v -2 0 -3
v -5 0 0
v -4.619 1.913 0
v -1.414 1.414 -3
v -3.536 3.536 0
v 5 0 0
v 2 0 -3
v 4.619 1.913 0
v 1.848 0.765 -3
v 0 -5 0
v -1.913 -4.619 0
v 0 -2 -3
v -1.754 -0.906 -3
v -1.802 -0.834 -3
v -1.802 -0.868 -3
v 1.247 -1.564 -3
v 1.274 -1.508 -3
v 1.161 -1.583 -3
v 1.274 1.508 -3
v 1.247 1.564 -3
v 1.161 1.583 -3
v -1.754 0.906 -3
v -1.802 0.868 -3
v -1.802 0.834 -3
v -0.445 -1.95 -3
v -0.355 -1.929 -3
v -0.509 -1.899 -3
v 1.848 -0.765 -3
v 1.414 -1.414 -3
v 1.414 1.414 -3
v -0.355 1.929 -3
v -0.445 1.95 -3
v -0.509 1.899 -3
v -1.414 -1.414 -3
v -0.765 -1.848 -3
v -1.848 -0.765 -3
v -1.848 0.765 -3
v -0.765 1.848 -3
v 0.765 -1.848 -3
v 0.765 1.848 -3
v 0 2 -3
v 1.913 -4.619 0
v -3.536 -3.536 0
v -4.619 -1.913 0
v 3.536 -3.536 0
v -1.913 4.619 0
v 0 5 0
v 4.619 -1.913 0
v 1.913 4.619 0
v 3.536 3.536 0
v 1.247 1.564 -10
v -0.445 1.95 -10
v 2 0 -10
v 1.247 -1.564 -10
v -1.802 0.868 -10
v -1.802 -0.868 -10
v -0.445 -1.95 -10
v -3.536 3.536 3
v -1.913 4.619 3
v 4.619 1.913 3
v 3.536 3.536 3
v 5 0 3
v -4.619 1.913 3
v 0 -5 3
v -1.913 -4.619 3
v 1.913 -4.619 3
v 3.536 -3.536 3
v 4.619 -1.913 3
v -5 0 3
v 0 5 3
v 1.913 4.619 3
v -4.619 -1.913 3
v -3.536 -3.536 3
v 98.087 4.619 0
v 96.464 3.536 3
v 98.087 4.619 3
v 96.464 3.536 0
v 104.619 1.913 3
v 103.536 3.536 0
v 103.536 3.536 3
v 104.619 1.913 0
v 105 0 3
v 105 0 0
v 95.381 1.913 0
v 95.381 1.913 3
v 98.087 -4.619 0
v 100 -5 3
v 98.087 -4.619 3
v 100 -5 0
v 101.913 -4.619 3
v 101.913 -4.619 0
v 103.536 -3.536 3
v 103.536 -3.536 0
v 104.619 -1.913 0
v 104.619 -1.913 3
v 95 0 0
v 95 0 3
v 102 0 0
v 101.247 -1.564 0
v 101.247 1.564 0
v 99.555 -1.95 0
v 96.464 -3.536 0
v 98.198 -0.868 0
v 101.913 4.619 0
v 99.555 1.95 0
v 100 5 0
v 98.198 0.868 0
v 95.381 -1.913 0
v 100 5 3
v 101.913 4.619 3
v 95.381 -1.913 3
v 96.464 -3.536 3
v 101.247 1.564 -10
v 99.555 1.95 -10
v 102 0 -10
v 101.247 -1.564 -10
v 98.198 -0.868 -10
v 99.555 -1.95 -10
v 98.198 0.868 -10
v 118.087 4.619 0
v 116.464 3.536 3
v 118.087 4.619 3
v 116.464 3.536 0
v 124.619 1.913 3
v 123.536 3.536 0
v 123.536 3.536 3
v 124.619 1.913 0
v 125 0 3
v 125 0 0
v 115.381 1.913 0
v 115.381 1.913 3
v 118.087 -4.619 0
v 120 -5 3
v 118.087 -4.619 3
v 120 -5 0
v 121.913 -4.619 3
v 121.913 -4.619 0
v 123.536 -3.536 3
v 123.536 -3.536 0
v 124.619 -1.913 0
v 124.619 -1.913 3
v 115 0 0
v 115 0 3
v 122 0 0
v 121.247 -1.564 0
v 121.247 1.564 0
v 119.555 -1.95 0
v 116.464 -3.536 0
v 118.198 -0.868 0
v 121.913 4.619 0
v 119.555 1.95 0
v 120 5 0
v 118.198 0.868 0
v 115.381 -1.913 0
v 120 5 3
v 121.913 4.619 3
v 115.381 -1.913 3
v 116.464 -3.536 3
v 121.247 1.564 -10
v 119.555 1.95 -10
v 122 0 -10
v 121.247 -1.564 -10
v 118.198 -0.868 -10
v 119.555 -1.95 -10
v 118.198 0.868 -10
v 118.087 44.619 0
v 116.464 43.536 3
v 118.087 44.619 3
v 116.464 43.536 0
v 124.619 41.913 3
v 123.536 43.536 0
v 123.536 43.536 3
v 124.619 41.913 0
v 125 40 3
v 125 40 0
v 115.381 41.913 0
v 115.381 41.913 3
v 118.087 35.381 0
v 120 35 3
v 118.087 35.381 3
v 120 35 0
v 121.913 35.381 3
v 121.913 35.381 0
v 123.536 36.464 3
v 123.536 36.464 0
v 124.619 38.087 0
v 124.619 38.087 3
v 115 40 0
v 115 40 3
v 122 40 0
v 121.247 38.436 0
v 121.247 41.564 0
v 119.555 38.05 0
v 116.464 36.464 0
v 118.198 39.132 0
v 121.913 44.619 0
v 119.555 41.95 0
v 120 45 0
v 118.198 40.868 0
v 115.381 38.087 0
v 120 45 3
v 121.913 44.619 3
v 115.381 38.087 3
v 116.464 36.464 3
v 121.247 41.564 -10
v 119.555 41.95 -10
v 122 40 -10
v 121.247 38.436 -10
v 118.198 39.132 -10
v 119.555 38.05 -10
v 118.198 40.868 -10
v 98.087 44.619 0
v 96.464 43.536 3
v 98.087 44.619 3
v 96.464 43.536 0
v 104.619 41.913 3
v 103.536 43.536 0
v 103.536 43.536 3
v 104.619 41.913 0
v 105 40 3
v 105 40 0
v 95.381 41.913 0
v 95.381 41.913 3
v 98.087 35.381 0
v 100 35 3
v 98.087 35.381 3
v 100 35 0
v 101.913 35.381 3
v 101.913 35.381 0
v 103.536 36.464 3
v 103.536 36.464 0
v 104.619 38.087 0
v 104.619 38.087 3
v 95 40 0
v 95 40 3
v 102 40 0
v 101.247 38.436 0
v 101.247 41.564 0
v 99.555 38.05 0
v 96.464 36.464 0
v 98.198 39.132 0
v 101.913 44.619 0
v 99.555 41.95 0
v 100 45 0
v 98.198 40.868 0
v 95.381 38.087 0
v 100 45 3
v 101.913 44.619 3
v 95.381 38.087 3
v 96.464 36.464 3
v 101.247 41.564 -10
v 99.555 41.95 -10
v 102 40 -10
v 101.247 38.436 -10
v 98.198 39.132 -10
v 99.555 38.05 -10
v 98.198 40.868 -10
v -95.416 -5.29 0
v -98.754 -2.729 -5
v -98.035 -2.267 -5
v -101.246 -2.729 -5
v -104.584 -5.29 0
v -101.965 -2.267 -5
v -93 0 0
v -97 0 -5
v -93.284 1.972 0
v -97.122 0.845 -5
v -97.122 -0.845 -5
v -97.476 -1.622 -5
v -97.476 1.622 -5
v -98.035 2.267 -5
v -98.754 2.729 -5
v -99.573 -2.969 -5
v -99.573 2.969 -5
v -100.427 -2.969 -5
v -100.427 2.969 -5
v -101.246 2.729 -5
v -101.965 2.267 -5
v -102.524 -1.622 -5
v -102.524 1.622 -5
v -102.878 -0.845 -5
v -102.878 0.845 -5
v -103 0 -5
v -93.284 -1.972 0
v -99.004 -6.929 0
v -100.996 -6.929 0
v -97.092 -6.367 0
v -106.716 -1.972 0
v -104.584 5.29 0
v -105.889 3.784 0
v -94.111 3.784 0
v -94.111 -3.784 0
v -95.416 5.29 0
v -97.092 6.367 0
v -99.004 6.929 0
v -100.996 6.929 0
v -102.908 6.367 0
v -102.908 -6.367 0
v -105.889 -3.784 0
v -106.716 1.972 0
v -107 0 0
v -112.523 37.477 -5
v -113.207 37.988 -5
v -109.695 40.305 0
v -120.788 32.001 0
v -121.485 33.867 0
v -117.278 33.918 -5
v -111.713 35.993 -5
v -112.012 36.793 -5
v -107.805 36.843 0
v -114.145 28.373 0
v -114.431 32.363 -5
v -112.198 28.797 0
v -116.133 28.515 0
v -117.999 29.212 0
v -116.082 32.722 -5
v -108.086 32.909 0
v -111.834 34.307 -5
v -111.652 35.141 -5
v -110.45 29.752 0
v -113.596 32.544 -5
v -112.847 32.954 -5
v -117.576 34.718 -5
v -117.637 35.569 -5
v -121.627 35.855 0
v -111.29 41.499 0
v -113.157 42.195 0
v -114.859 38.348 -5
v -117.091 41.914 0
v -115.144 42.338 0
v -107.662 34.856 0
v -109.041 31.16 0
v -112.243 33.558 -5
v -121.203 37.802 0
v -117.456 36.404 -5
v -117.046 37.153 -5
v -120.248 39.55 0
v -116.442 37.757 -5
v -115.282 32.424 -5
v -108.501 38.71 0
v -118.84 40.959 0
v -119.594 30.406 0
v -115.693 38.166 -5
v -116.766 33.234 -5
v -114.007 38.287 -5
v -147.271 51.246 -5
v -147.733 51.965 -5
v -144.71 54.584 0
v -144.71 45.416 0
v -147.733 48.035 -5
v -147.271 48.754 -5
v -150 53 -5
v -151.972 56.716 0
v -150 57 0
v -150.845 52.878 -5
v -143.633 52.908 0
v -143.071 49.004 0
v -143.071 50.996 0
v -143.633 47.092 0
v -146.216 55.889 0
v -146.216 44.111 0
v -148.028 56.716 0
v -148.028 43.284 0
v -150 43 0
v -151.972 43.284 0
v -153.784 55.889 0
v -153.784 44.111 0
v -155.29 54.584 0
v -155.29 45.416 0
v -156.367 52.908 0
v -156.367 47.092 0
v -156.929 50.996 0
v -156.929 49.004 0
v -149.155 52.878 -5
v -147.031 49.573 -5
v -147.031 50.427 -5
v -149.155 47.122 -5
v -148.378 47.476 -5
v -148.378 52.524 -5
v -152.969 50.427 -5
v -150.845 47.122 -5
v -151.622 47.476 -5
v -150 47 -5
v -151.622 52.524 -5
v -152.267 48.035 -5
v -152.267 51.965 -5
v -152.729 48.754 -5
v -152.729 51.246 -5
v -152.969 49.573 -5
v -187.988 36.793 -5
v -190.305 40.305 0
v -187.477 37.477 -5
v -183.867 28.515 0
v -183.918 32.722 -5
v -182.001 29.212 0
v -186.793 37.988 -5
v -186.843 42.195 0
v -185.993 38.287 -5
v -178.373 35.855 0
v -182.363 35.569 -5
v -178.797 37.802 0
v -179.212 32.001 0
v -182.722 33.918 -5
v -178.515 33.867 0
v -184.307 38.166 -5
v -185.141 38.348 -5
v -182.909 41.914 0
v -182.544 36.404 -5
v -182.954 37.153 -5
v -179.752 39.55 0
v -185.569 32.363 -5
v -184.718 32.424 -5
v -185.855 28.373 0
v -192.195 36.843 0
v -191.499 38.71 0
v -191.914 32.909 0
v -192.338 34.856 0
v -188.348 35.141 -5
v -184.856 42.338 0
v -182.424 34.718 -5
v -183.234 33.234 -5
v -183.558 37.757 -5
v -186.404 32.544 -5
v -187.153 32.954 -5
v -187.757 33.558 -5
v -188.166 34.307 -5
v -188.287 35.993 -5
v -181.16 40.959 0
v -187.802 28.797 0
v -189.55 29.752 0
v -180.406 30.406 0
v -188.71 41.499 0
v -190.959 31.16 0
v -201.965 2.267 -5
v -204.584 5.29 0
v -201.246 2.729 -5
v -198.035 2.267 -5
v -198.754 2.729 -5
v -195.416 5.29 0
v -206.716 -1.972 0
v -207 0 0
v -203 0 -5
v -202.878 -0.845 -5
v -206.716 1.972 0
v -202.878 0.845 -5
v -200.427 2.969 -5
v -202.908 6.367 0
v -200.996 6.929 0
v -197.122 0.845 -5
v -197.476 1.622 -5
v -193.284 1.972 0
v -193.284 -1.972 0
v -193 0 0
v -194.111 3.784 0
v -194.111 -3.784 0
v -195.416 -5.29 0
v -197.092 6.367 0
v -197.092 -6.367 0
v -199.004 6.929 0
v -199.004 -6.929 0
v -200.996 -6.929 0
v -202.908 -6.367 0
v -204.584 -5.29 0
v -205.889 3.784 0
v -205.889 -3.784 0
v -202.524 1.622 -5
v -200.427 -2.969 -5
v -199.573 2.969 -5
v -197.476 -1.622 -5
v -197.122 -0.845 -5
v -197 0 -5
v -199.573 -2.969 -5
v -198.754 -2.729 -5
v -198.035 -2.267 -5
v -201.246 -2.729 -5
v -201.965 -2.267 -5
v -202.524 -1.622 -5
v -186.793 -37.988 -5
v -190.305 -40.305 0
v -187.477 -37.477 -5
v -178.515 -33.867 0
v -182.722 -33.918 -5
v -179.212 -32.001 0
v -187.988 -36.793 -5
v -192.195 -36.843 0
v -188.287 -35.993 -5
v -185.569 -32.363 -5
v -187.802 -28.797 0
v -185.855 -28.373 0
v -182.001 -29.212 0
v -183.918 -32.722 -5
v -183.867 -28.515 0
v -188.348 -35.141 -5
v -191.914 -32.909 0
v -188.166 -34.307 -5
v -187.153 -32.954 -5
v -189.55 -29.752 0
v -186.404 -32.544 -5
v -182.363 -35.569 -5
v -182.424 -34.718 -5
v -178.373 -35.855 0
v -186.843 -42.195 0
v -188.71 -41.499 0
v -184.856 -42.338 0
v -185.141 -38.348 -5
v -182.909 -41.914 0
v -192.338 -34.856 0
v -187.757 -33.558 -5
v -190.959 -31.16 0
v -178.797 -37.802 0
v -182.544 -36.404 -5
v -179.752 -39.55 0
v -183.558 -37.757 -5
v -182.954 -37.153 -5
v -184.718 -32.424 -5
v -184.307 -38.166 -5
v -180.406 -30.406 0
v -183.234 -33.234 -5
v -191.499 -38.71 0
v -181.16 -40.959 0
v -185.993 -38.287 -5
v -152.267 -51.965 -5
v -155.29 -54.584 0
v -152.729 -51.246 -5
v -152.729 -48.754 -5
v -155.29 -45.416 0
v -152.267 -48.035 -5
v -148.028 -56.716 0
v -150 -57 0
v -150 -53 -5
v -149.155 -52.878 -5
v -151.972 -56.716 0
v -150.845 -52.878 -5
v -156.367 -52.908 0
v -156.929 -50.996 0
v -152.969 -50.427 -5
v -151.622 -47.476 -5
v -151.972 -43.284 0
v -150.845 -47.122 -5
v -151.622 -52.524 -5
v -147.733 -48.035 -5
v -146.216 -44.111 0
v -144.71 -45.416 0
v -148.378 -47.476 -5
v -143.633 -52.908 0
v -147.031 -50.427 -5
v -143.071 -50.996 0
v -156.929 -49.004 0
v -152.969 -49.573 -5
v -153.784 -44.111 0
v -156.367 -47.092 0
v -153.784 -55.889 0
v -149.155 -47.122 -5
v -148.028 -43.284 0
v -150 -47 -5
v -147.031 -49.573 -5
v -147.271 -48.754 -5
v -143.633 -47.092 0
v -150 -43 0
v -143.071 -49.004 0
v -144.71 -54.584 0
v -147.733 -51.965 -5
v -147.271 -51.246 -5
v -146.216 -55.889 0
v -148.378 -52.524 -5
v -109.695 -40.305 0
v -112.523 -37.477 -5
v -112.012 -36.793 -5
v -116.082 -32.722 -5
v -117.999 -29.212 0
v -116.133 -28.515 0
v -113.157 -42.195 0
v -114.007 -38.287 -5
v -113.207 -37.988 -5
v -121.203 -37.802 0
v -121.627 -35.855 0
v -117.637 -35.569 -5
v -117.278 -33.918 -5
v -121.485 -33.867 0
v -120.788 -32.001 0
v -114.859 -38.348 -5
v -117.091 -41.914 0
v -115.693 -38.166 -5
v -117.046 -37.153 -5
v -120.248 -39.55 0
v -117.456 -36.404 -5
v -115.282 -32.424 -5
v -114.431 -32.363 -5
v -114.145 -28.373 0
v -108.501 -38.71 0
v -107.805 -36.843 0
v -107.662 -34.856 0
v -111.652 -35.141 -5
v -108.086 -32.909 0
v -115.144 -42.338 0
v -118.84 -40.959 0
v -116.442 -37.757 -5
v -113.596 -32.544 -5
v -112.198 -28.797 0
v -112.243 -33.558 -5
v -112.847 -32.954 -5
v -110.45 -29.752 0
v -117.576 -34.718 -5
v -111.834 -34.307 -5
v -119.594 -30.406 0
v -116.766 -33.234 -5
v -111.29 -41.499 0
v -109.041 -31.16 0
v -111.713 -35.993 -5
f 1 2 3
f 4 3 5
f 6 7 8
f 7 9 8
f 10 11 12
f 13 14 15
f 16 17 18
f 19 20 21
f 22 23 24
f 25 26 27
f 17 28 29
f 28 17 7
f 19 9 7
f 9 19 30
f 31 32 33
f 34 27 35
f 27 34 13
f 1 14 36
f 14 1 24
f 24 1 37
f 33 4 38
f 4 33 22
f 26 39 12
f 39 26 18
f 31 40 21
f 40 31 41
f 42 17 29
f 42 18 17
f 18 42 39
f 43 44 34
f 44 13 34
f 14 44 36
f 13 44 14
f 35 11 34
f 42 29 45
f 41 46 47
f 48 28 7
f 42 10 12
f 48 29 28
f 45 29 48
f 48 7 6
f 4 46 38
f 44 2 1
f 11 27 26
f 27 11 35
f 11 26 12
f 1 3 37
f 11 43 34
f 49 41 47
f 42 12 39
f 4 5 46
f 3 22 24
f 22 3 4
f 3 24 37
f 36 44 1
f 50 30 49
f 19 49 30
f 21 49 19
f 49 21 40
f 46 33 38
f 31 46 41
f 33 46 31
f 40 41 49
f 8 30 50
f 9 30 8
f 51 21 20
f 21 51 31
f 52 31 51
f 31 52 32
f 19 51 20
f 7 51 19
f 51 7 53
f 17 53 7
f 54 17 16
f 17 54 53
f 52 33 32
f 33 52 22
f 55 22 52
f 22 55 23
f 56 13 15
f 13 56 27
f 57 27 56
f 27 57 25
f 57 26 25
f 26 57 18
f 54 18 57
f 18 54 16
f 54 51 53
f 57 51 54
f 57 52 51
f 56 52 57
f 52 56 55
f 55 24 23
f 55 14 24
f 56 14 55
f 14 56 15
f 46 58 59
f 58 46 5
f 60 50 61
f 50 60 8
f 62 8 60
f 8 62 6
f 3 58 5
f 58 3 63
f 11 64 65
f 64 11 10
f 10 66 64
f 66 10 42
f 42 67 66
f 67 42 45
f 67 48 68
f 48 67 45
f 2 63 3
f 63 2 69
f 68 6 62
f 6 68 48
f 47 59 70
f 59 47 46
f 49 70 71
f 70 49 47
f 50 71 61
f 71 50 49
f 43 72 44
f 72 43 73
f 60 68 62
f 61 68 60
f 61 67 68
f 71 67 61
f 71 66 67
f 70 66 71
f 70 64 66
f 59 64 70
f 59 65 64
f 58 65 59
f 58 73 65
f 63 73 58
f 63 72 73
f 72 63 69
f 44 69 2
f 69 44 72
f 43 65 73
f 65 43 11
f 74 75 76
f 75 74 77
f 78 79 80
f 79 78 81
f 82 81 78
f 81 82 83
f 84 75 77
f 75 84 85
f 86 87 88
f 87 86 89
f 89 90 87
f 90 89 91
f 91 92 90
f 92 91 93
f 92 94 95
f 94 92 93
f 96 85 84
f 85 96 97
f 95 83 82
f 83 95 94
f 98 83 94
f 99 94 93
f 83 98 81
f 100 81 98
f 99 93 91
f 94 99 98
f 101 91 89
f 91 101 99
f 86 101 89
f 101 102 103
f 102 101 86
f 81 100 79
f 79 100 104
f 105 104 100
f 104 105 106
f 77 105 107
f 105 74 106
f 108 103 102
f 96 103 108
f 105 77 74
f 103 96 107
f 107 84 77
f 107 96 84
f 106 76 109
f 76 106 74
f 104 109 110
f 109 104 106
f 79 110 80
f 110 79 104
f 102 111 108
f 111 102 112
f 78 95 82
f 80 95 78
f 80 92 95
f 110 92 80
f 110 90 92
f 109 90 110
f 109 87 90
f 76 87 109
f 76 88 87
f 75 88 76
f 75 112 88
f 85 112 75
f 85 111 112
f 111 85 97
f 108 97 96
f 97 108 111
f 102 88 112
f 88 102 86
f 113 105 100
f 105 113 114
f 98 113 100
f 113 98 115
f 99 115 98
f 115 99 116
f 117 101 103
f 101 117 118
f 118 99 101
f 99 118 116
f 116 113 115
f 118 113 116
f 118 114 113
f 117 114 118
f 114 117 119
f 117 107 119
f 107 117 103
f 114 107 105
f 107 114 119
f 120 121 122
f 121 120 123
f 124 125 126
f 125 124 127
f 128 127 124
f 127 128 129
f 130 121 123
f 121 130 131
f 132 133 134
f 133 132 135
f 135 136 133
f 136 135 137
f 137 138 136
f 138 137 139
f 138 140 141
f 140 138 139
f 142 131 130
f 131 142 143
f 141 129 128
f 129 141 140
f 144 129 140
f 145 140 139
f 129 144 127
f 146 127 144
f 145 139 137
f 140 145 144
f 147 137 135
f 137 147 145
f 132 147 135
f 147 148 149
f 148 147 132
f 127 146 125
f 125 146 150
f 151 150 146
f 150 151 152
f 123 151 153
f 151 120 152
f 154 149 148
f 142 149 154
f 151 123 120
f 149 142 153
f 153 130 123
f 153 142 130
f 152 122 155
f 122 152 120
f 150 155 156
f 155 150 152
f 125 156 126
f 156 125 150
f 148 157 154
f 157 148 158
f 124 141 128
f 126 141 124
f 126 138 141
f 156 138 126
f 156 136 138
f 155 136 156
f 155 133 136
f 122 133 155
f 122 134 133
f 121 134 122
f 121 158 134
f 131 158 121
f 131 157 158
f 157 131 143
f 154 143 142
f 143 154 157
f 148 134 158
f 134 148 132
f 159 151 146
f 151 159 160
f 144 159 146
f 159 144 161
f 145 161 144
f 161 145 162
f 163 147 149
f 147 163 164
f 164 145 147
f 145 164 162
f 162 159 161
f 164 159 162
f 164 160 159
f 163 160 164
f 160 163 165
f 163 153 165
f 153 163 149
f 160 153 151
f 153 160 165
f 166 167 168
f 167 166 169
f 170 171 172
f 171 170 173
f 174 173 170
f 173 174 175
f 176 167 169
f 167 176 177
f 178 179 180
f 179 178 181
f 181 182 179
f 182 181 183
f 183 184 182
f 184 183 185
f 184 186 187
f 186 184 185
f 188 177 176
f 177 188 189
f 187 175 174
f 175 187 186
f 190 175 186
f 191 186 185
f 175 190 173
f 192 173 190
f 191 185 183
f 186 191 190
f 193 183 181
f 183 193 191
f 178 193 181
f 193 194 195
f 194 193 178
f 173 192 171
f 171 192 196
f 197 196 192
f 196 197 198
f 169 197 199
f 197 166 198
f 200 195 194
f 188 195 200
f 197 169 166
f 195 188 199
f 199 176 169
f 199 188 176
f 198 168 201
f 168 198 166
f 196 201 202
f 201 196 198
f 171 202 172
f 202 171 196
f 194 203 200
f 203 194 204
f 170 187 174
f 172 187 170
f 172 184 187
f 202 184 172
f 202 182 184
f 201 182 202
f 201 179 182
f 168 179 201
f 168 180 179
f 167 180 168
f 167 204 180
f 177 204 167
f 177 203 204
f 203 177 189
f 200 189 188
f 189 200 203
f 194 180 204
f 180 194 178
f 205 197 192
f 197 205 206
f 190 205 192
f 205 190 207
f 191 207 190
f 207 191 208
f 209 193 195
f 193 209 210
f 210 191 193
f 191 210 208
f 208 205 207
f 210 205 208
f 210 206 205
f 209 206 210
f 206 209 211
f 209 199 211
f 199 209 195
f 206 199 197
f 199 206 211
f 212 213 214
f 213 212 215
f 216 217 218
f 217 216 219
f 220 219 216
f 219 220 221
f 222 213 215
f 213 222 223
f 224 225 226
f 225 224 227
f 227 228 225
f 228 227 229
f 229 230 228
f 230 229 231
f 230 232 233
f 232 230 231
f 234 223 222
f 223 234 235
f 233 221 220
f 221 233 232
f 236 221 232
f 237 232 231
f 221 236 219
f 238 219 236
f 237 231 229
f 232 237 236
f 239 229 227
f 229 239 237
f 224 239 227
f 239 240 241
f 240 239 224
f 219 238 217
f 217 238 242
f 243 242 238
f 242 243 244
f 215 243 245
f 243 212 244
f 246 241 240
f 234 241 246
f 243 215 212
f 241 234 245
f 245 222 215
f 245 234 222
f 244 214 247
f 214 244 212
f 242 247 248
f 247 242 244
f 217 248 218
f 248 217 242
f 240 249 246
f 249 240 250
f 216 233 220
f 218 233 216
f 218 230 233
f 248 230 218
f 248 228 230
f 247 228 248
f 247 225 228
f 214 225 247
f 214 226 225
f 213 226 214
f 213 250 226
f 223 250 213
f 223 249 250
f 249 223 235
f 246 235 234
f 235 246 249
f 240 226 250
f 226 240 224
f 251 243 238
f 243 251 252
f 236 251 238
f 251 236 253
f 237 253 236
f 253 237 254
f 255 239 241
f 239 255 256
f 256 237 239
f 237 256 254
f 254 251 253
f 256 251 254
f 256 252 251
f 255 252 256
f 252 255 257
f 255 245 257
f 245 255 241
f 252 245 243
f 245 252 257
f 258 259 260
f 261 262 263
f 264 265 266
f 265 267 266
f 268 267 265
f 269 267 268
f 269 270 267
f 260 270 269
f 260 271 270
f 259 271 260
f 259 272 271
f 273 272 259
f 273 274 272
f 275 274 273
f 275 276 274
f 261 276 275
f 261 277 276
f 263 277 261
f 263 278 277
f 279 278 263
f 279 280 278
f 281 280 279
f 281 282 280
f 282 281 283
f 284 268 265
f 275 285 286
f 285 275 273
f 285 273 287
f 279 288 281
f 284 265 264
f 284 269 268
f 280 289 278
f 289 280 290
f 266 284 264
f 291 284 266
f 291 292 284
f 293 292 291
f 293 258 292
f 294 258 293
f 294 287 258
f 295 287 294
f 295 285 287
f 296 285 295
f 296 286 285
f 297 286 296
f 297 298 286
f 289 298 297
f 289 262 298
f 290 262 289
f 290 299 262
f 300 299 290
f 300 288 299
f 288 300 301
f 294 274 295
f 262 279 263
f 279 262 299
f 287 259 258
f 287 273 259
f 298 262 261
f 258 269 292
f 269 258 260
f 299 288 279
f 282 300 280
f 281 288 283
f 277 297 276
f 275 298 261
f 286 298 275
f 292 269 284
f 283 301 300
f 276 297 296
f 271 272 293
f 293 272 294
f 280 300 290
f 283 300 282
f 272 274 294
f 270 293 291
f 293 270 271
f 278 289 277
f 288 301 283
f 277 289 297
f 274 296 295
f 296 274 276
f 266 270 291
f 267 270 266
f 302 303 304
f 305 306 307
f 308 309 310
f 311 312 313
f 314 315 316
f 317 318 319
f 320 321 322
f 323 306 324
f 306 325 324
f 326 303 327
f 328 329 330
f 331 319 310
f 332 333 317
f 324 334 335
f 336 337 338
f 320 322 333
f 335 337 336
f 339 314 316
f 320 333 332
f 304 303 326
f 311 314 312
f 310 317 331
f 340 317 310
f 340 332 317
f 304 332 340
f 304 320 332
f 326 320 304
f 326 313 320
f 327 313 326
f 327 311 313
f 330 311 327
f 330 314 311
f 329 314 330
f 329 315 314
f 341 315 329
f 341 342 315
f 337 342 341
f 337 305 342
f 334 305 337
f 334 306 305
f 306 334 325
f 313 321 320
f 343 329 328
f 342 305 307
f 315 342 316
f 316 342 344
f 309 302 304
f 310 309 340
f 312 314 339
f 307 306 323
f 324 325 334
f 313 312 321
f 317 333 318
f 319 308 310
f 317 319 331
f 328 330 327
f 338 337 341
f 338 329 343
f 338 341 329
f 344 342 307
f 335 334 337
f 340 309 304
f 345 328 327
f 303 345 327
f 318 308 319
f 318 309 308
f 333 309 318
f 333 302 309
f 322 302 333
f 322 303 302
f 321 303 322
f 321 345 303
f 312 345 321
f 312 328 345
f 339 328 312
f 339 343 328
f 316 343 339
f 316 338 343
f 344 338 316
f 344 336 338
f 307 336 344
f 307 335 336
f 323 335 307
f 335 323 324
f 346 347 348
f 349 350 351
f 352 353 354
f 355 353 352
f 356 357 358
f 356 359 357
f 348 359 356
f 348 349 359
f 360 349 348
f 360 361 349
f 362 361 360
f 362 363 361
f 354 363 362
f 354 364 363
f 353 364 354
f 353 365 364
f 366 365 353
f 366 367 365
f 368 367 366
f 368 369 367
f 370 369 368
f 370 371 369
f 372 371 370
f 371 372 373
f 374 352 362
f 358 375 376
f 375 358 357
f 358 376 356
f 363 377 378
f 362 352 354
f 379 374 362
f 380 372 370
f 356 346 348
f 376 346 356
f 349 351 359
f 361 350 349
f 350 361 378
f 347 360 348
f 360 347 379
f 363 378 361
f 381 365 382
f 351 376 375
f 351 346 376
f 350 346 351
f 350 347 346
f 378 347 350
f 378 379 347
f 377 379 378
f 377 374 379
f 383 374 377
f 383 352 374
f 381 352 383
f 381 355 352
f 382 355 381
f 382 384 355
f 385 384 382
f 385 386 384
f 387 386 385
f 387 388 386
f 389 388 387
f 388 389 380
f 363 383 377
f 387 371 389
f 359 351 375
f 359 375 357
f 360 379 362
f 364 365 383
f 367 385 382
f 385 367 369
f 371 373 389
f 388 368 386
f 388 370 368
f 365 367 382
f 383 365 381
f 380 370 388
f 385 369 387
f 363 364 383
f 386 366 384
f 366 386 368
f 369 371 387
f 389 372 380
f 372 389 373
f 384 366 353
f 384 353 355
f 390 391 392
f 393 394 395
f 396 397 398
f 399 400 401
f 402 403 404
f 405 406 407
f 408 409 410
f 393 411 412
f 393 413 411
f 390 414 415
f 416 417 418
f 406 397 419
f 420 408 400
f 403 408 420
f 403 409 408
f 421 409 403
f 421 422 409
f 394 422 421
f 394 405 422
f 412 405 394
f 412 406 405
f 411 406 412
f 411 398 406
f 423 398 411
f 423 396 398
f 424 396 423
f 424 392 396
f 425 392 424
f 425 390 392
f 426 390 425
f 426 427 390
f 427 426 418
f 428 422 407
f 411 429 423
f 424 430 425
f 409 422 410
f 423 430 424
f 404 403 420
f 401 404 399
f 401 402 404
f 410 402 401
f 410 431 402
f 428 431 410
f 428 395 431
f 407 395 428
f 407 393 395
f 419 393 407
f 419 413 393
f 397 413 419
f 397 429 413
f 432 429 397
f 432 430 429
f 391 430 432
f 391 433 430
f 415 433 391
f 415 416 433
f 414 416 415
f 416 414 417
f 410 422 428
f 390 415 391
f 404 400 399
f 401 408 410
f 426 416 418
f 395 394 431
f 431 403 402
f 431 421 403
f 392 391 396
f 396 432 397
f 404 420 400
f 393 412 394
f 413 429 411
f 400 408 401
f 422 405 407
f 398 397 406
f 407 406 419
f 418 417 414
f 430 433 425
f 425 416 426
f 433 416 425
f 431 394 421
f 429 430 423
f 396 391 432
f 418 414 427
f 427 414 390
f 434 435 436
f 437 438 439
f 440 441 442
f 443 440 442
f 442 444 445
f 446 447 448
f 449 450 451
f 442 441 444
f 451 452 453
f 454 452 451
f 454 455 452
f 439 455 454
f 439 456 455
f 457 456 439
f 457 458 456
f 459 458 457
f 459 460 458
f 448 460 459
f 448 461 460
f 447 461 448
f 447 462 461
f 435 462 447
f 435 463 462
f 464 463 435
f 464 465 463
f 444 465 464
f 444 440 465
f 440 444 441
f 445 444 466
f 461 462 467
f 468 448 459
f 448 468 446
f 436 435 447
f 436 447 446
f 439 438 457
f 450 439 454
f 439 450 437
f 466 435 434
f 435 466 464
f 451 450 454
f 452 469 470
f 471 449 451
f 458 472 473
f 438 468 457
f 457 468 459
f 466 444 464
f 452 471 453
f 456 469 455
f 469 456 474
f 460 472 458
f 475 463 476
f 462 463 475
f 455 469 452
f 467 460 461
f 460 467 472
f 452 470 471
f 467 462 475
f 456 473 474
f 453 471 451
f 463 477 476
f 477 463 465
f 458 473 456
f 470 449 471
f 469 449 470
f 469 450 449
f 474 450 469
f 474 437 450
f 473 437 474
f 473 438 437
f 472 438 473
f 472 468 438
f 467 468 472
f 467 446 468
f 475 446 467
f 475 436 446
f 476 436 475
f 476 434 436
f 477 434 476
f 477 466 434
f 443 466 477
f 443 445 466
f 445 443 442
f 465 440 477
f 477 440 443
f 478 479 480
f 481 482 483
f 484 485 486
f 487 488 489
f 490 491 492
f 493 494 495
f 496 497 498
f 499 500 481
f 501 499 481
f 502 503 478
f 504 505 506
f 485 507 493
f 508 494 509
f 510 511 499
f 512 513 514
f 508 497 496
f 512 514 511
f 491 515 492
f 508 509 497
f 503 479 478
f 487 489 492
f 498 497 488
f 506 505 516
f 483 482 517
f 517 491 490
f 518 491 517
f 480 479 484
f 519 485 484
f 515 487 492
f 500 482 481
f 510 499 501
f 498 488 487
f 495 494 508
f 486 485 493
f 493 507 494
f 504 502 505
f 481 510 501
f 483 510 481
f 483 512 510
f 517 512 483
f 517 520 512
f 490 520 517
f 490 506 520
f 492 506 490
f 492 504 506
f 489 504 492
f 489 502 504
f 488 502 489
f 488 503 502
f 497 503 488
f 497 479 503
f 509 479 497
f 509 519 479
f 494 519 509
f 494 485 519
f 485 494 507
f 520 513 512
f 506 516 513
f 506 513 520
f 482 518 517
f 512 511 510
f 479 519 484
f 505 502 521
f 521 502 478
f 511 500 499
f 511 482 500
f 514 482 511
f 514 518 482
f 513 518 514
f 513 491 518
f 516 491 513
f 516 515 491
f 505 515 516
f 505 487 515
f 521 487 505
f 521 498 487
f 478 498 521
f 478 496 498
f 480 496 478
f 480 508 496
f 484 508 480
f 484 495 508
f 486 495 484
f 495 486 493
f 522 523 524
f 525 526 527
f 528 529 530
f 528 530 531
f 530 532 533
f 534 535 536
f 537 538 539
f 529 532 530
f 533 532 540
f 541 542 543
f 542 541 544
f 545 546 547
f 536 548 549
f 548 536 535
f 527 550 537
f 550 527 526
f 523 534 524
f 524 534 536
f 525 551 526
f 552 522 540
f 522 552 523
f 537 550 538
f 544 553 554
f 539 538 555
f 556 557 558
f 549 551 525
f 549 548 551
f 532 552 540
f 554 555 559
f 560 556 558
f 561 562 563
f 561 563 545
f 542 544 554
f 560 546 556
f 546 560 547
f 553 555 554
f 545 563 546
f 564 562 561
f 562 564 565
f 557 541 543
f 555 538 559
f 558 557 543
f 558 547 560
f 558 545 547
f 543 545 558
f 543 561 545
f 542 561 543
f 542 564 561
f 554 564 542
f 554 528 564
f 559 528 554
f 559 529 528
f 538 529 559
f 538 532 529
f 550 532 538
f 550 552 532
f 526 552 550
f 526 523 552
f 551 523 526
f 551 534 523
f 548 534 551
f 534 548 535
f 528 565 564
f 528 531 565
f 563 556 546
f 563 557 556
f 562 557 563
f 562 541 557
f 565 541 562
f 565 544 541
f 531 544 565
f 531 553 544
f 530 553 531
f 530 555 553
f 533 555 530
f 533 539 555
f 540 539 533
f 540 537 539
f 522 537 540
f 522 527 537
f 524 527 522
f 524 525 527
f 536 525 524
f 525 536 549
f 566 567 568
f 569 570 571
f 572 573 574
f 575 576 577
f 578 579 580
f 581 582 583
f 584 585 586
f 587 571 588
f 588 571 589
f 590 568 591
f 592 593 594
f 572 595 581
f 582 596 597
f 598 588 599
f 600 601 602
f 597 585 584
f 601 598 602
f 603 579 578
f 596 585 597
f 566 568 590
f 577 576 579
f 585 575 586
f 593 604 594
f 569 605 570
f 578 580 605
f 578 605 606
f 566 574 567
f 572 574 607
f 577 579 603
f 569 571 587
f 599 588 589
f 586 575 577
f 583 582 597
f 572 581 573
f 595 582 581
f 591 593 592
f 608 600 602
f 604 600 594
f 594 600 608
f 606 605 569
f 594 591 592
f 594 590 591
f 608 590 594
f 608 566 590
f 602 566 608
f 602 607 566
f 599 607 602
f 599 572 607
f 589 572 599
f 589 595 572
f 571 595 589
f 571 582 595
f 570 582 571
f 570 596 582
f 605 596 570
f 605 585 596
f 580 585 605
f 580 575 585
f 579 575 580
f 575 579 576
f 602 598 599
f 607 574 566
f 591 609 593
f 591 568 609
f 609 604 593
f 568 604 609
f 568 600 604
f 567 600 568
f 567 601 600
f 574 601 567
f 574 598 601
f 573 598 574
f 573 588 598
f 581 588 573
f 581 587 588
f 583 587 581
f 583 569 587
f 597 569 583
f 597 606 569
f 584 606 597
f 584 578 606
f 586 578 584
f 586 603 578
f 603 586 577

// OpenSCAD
/*
    Intended to make space for a fastener.

    parameters:
    -head           a vector [head length, head radius]
    -bore           a vector [bore length, bore radius]
    -countersink    countersink length, requires head radius and bore radius
*/

module fastener_hole(
    head = [0, 5],
    bore = [0, 3],
    countersink = 5
) {
    if (head[0] && head[1])
    cylinder(h = head[0], r = head[1], center = false);
    translate([0,0,-countersink]) {
        if (countersink)
        cylinder(h = countersink, r1 = bore[1], r2 = head[1], center = false);

        translate([0,0,-bore[0]]) {
            if (bore[0] && bore[1])
            cylinder(h = bore[0], r = bore[1], center = false);
        }
    }
}

module fastener_block(
    size,
    head = [0, 0],
    bore = [0, 0],
    countersink = 0
) {

    fastener_hole(head = head, bore = bore, countersink = countersink);
    translate([size.x, 0])
    fastener_hole(head = head, bore = bore, countersink = countersink);
    translate([size.x, size.y])
    fastener_hole(head = head, bore = bore, countersink = countersink);
    translate([0, size.y])
    fastener_hole(head = head, bore = bore, countersink = countersink);

}

module fastener_radial(
    radius,
    amount,
    head = [0, 6],
    bore = [0, 3],
    countersink = 5
) {
    step = 360 / amount;
    for(i = [0:amount]){
        rotate(i * step, [0,0,1])
        translate([radius,0,0]) 
        fastener_hole(head=head, bore=bore, countersink=countersink);
    }
}

// showcase
fastener_hole(
    head = [3,5],
    bore = [7,2],
    countersink = 3
);

translate([100, 0, 0]) 
fastener_block(
    size = [20, 40],
    head = [3, 5],
    bore = [10, 2],
    countersink = 0
);

translate([-150, 0, 0]) 
fastener_radial(
    radius = 50,
    amount = 8,
    head = [0, 7],
    bore = [0, 3],
    countersink = 5
);
